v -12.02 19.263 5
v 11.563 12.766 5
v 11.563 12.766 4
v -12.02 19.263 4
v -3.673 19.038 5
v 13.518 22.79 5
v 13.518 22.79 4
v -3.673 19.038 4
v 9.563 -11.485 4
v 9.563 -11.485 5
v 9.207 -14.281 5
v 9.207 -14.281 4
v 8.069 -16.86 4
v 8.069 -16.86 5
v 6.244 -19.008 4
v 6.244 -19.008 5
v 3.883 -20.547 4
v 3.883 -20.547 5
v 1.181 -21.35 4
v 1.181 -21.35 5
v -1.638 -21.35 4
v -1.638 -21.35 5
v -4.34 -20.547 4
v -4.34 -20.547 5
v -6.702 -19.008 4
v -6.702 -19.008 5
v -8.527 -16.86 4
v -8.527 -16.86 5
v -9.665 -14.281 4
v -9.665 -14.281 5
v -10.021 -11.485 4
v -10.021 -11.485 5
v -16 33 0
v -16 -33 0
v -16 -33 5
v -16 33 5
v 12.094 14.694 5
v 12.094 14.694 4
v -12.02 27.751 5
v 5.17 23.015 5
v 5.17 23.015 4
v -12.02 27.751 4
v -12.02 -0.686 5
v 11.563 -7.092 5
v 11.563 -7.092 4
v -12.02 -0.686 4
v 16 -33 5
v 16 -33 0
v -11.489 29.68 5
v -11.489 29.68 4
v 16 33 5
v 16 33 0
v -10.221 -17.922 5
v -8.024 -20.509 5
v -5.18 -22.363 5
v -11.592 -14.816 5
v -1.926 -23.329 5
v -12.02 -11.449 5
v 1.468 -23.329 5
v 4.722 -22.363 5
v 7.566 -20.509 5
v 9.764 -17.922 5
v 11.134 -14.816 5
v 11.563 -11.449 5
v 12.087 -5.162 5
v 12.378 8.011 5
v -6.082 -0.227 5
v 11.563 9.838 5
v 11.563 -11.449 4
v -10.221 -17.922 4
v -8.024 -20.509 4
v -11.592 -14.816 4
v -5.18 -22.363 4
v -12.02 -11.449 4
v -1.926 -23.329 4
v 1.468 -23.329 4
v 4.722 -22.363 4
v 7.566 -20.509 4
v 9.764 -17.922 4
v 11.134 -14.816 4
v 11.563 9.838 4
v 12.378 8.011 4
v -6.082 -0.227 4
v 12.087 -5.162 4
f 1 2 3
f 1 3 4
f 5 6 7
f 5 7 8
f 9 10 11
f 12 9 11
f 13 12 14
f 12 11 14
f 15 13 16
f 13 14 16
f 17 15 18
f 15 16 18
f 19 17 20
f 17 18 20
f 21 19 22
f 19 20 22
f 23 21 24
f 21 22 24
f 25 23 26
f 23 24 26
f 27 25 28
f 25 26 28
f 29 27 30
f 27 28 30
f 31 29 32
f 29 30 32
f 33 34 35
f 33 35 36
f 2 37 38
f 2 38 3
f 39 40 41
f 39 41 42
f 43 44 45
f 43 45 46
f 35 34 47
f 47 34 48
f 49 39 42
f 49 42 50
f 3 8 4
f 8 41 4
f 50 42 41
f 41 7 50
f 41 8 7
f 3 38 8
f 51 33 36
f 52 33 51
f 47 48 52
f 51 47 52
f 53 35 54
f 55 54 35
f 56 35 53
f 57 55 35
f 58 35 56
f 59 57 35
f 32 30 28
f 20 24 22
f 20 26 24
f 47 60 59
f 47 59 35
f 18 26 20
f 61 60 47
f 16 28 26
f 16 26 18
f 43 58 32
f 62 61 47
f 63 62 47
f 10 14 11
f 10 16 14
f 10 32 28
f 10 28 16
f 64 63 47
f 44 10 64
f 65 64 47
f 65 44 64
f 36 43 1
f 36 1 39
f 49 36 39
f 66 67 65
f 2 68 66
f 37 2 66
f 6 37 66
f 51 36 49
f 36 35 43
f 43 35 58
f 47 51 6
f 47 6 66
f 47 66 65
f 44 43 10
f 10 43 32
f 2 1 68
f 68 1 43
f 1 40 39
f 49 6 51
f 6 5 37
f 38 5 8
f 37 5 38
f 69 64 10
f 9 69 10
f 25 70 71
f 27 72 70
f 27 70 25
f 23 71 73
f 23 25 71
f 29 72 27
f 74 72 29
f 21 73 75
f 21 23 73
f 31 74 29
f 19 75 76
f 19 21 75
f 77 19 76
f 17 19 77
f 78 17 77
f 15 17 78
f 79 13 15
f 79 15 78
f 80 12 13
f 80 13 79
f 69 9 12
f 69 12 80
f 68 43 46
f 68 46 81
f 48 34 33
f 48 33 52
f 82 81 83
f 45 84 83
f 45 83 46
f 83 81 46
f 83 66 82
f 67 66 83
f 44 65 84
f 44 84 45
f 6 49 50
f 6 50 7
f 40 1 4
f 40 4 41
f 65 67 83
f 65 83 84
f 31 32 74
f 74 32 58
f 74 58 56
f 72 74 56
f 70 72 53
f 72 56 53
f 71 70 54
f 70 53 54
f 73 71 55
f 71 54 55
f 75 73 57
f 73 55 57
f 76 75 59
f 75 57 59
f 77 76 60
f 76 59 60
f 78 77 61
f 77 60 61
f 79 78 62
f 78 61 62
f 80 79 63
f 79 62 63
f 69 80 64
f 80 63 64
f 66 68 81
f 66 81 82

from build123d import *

# Parameters (mm, degrees)
ESQUISSE1_W             = 32
ESQUISSE1_H             = 66
BOSS_EXTRU_1_DEPTH      = 5
ENL_V_MAT_EXTRU_1_DEPTH = 1


with BuildPart() as part:
    # Esquisse1 → Boss.-Extru.1 (new body)
    with BuildSketch(Plane.XY):
        Rectangle(ESQUISSE1_W, ESQUISSE1_H)
    extrude(amount=BOSS_EXTRU_1_DEPTH)

    # Esquisse2 → Enlèv. mat.-Extru.1 (cut)
    with BuildSketch(Plane.XY.offset(5)):
        with BuildLine():
            Line((-10.020527486, -11.48471415), (-12.020211327, -11.449153833))
            ThreePointArc((-12.020211327, -11.449153833), (-0.228779166, -23.452136955), (11.562652994, -11.449153833))
            Line((11.562652994, -11.449153833), (9.562969153, -11.48471415))
            ThreePointArc((9.562969153, -11.48471415), (-0.228779166, -21.452136955), (-10.020527486, -11.48471415))
        make_face()
        Polygon((11.562652994, -7.092154157), (-12.020211327, -0.686337499), (11.562652994, 9.837504153), (12.377681975, 8.011106671), (-6.082483824, -0.226733274), (12.086916587, -5.162089991), align=None)
        Polygon((11.562652994, 12.765877482), (-12.020211327, 19.263205806), (5.170409159, 23.015184134), (-12.020211327, 27.751381734), (-11.488983181, 29.679540611), (13.517651309, 22.78994856), (-3.672969177, 19.037970232), (12.09388114, 14.694036359), align=None)
    extrude(amount=-ENL_V_MAT_EXTRU_1_DEPTH, mode=Mode.SUBTRACT)


solid = part.part
